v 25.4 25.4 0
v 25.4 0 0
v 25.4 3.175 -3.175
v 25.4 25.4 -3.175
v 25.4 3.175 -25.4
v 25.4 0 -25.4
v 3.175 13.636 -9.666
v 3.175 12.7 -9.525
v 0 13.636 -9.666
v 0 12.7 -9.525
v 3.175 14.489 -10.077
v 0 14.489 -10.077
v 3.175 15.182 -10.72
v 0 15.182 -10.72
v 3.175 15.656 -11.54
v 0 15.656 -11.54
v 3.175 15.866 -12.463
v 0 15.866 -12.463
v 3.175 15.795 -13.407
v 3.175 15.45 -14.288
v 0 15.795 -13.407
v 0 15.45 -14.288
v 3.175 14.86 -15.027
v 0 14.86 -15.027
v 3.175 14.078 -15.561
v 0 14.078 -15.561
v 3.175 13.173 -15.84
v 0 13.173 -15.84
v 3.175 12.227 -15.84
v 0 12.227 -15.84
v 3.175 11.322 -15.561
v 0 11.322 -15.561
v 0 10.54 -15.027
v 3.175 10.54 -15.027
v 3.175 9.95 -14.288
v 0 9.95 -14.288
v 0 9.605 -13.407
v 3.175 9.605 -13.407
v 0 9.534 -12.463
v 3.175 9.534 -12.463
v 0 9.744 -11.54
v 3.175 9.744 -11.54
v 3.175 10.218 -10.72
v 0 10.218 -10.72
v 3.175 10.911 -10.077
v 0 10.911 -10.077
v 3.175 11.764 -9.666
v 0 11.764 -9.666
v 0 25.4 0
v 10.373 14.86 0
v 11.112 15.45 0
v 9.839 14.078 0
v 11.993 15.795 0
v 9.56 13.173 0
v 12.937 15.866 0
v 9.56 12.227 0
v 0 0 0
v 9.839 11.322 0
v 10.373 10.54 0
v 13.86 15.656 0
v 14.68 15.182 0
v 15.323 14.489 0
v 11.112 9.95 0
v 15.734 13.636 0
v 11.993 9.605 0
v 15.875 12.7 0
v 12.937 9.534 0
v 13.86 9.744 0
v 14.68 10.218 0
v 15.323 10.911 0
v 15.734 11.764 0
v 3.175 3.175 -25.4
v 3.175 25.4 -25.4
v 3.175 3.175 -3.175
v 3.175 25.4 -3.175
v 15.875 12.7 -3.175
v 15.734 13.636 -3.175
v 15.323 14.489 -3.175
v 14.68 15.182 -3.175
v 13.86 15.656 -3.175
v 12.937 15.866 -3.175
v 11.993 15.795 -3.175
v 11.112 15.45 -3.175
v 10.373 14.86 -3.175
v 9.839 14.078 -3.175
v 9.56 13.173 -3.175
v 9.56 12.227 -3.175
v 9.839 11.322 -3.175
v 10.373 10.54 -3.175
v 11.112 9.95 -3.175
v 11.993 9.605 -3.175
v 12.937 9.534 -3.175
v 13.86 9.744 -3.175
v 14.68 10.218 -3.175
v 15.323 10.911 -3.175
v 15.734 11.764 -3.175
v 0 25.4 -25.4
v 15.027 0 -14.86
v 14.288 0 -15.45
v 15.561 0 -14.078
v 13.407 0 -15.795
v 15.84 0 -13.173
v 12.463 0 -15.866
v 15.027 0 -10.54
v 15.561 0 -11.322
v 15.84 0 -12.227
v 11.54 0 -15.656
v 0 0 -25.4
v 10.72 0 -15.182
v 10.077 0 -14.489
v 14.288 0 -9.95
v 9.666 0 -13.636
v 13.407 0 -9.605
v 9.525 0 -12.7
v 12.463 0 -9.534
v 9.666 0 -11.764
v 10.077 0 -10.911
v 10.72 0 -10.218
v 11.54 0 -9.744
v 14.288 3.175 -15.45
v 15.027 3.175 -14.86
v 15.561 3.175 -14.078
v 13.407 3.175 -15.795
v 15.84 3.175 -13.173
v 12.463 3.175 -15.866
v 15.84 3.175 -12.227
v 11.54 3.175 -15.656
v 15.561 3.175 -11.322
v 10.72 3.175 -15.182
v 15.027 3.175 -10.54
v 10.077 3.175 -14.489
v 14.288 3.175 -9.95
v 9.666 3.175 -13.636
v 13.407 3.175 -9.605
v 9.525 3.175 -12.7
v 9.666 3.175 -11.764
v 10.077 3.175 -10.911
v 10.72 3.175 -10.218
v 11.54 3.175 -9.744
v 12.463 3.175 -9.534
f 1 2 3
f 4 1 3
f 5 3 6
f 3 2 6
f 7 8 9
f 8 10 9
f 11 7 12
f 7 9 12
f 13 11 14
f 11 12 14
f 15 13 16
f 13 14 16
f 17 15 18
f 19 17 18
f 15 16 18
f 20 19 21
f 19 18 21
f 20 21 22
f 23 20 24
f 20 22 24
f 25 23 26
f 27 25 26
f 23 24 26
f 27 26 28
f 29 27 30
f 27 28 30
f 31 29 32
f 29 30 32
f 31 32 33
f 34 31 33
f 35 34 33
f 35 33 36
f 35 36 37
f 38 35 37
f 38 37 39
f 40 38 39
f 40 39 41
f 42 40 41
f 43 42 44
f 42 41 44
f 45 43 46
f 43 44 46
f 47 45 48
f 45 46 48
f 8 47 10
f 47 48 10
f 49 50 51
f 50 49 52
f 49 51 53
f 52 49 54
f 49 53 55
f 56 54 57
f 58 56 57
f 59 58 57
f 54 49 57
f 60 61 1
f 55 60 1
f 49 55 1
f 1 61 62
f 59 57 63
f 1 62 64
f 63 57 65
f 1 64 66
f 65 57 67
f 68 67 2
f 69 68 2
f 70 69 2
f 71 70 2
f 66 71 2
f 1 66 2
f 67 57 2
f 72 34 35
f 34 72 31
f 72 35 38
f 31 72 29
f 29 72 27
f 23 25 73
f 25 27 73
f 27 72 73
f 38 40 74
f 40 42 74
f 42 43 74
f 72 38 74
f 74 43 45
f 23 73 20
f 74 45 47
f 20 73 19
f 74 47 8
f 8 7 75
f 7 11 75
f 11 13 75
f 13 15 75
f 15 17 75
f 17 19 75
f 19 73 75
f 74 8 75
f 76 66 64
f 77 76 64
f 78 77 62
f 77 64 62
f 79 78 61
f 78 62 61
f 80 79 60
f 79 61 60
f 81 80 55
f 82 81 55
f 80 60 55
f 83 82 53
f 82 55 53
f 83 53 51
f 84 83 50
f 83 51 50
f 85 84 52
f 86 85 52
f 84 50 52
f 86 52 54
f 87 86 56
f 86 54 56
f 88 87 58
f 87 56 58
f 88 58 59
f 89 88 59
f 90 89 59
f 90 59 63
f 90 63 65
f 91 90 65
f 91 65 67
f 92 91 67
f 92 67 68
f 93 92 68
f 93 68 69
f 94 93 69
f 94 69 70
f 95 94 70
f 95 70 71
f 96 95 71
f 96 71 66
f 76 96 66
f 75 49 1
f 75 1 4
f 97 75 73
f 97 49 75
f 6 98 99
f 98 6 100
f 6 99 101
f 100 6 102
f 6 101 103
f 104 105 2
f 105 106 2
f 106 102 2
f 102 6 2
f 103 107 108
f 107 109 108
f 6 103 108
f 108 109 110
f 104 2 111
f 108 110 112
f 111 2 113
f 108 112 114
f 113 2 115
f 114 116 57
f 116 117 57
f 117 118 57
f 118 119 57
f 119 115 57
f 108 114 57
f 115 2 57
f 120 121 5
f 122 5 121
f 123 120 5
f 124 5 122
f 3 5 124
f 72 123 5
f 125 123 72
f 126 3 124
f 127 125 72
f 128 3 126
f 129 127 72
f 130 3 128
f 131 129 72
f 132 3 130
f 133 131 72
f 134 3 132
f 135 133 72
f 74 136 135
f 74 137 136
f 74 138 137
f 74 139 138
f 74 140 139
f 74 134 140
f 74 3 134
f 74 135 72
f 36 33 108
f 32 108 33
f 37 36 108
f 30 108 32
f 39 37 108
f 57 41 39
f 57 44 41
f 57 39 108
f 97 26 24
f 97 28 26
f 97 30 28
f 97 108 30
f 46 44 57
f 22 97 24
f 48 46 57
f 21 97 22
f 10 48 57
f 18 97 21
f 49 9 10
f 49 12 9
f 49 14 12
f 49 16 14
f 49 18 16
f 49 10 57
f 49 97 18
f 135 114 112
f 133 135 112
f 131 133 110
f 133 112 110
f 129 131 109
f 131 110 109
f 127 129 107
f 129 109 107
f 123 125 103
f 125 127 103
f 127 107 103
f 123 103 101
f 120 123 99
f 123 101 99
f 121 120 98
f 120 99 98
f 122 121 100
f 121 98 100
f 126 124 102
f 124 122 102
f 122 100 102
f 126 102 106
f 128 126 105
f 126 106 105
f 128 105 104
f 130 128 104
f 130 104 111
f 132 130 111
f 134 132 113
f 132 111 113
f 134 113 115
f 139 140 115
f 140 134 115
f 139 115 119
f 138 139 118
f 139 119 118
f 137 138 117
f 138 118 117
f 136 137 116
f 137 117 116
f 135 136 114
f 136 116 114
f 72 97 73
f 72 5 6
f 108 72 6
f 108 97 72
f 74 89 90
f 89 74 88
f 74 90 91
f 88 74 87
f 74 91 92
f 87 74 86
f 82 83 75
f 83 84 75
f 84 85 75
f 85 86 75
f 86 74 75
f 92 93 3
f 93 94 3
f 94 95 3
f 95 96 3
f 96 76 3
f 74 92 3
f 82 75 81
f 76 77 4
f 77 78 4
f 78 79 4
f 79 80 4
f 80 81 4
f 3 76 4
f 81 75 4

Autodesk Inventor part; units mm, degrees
ref_plane "YZ Plane" through (0, 0, 0) normal (1, 0, 0) x (0, 1, 0)
ref_plane "XZ Plane" through (0, 0, 0) normal (0, 1, 0) x (-1, 0, 0)
ref_plane "XY Plane" through (0, 0, 0) normal (0, 0, 1) x (1, 0, 0)
sketch "Sketch1" plane through (0, 0, 0) normal (0, 1, 0) x (-1, 0, 0)
  line L0 (0, 0) -> (-25.4, 0)
  line L1 (-25.4, 0) -> (-25.4, -25.4)
  line L2 (-25.4, -25.4) -> (0, -25.4)
  line L3 (0, -25.4) -> (0, 0)
  line L4 (0, 0) -> (-25.4, -25.4) construction
  line L5 (0, -25.4) -> (-25.4, 0) construction
  circle A0 centre (-12.7, -12.7) radius 3.175
  dimension "d0" = 25.4
  dimension "d1" = 25.4
  dimension "d2" = 6.35
extrude "Extrusion1" add sketch "Sketch1" along normal blind 3.175
sketch "Sketch2" plane through (0, 0, 0) normal (0, 0, 1) x (1, 0, 0)
  line L0 (0, 0) -> (0, 3.175) projected
  line L1 (0, 0) -> (25.4, 0)
  line L2 (25.4, 0) -> (25.4, 25.4)
  line L3 (25.4, 25.4) -> (0, 25.4)
  line L4 (0, 25.4) -> (0, 0)
  line L5 (25.4, 0) -> (25.4, 3.175) construction
  line L6 (0, 25.4) -> (25.4, 0) construction
  line L7 (25.4, 25.4) -> (0, 0) construction
  circle A0 centre (12.7, 12.7) radius 3.175
  dimension "d5" = 25.4
  dimension "d6" = 25.4
  dimension "d7" = 6.35
extrude "Extrusion2" add sketch "Sketch2" against normal blind 3.175
sketch "Sketch3" plane through (0, 0, -25.4) normal (-1, 0, 0) x (0, 0, 1)
  line L0 (0, 0) -> (25.4, 0) projected
  line L1 (25.4, 0) -> (25.4, 25.4) projected
  line L2 (0, 0) -> (25.4, 0)
  line L3 (25.4, 0) -> (25.4, 25.4)
  line L4 (25.4, 25.4) -> (0, 25.4)
  line L5 (0, 25.4) -> (0, 0)
  line L6 (0, 25.4) -> (25.4, 0) construction
  line L7 (25.4, 25.4) -> (0, 0) construction
  circle A0 centre (12.7, 12.7) radius 3.175
  dimension "d10" = 25.4
  dimension "d11" = 6.35
extrude "Extrusion3" add sketch "Sketch3" against normal blind 3.175
properties part number "MountingBracket"
